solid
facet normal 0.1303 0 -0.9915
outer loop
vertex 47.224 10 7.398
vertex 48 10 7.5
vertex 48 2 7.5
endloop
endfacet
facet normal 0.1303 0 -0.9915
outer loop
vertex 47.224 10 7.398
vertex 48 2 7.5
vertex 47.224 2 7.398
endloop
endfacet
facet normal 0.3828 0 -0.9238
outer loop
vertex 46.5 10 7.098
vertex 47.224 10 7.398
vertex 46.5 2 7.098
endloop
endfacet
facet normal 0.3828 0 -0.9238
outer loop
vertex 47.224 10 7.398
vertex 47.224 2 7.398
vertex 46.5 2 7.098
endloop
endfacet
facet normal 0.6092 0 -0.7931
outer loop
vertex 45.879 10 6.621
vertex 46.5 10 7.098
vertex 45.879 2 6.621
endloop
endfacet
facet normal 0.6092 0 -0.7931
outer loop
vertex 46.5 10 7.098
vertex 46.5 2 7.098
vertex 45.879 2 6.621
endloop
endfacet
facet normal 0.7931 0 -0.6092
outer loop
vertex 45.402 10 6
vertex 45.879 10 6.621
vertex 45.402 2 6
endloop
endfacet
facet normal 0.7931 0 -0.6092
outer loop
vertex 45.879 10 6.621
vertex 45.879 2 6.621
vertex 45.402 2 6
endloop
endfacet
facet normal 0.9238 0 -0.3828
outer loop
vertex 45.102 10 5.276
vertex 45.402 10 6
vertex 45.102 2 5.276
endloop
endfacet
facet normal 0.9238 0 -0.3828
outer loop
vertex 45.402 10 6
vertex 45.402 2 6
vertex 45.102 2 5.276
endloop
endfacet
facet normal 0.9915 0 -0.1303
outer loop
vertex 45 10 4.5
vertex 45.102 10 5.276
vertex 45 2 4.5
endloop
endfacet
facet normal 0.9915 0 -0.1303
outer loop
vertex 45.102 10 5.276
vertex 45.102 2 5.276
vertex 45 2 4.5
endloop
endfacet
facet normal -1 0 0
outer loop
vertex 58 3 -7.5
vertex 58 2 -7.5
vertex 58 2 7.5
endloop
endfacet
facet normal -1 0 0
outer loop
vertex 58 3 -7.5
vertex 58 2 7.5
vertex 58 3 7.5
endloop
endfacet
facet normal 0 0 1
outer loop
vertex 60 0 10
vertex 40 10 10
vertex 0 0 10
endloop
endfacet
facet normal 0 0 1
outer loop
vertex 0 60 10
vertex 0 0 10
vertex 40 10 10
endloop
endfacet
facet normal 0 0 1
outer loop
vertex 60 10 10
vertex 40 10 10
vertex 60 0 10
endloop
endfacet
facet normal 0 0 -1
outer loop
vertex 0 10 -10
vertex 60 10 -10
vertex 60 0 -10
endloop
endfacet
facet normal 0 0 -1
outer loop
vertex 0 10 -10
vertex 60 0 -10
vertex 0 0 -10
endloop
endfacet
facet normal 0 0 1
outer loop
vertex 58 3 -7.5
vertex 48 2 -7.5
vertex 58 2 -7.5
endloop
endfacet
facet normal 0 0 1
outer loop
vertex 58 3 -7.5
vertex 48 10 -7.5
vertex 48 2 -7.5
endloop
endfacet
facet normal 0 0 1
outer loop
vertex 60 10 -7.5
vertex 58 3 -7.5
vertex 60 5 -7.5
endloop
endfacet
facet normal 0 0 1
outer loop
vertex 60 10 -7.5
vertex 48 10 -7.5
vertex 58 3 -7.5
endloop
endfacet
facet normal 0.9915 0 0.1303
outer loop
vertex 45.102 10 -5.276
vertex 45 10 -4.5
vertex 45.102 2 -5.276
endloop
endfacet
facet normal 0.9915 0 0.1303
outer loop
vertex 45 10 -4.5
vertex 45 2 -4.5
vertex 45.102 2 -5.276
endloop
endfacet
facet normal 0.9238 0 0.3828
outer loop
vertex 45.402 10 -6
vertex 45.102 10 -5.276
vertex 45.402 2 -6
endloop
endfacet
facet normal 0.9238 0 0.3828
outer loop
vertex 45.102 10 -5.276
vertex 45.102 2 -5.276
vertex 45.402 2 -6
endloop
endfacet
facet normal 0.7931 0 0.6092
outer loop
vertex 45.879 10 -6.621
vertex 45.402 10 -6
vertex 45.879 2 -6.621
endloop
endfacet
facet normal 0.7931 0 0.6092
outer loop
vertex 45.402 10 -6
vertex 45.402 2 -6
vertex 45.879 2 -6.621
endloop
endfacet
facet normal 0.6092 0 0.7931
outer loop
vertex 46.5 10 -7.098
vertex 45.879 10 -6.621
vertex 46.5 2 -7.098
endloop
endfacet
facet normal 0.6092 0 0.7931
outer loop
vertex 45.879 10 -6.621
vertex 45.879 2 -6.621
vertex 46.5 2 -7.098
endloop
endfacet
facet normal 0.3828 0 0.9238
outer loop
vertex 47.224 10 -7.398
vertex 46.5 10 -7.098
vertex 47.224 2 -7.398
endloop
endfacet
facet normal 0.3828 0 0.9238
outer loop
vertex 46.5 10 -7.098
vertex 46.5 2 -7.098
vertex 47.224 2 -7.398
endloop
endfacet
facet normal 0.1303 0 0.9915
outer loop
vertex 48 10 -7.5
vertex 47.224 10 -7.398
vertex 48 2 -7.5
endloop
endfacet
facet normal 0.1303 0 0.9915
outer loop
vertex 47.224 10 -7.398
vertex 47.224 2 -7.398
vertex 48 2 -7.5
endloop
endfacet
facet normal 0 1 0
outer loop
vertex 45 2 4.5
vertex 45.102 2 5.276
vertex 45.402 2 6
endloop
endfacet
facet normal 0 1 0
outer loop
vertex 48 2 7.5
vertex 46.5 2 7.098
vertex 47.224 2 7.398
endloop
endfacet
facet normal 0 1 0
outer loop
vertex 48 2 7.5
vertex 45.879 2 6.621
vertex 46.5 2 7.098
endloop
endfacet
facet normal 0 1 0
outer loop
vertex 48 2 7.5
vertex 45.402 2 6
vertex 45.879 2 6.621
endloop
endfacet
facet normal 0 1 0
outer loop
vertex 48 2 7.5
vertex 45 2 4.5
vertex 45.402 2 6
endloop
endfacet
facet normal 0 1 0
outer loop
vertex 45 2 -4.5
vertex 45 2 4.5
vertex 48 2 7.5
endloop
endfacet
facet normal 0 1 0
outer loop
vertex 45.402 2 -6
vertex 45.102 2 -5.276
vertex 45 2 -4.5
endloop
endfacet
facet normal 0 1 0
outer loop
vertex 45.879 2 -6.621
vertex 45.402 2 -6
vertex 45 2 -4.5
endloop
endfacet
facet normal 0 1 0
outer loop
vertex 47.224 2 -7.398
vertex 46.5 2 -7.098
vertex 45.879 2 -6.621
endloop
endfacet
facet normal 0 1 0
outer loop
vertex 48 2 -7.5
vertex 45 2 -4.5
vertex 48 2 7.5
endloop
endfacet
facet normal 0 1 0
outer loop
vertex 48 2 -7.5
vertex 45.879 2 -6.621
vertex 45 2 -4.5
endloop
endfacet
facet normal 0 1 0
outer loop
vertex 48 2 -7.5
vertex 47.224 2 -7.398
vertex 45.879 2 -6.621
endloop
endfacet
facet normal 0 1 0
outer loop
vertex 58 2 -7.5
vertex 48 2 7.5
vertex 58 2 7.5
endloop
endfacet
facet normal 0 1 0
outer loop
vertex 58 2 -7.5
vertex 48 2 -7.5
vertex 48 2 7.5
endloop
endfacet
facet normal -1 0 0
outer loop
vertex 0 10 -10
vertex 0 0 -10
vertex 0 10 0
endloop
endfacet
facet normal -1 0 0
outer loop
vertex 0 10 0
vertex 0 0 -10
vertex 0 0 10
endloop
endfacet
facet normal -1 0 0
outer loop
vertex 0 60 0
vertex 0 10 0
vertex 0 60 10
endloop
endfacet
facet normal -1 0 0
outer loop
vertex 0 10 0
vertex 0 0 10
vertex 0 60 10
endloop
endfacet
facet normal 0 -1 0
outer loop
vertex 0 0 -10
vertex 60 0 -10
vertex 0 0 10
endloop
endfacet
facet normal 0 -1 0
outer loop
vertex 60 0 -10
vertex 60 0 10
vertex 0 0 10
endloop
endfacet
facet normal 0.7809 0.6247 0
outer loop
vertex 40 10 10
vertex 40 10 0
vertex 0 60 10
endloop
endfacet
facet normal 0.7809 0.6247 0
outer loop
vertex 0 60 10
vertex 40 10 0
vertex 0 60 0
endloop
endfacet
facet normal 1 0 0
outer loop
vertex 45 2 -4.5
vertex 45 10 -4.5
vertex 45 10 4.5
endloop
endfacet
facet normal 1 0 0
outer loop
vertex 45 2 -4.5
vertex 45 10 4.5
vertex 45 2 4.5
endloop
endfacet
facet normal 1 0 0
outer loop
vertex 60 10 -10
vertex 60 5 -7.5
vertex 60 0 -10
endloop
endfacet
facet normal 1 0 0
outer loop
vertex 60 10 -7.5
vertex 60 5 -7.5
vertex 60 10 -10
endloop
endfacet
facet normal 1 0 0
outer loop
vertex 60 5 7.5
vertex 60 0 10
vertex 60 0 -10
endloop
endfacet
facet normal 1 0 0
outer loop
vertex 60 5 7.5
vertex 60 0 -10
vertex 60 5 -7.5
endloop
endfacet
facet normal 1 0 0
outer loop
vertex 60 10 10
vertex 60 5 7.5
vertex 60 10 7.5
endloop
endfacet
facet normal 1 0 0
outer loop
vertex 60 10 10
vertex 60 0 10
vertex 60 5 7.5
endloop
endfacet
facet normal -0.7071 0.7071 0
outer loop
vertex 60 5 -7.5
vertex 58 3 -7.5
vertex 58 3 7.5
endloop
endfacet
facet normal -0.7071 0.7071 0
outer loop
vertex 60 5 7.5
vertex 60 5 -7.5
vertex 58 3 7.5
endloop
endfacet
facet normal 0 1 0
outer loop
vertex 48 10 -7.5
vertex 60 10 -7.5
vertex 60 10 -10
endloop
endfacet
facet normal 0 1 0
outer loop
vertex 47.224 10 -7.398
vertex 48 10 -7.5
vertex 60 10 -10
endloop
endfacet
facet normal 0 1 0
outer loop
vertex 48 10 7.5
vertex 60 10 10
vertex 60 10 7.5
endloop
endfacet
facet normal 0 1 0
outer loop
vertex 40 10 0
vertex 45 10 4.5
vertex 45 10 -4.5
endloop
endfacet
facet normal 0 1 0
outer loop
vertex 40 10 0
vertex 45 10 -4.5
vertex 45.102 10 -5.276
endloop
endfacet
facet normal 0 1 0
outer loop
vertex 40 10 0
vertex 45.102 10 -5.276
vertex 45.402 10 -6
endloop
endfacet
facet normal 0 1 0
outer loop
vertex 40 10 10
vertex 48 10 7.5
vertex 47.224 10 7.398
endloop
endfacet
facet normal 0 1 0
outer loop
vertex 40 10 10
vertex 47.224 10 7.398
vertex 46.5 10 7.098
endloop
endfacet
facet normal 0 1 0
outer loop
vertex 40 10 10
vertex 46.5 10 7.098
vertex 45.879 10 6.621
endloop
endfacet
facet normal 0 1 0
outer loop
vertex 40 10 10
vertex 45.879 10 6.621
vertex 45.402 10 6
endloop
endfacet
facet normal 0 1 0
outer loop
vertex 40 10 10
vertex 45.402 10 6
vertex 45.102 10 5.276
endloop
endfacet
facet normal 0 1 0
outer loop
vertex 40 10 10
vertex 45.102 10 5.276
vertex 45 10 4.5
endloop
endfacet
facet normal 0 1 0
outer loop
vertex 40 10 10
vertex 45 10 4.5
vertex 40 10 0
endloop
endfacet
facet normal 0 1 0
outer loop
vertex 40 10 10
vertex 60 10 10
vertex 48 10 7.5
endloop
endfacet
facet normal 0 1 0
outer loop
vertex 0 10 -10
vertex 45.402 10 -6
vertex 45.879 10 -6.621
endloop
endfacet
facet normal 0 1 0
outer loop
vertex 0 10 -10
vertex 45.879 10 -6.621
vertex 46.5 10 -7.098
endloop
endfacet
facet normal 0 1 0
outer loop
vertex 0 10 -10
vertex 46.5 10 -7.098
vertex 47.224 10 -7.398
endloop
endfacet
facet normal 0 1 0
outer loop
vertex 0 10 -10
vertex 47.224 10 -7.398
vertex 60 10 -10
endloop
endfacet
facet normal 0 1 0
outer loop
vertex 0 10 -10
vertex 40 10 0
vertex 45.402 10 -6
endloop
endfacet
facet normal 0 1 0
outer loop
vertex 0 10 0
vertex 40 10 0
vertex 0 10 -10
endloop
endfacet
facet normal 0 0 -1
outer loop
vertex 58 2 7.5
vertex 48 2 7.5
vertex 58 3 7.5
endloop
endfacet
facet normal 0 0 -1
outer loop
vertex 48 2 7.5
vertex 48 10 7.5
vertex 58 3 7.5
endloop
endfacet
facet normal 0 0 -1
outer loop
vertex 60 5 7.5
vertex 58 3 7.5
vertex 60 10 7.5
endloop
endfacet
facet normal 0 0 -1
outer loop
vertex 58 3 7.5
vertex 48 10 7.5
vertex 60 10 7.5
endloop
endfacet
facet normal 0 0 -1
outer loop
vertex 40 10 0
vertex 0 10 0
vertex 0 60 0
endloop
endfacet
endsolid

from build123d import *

# Parameters (mm, degrees)
AUFSATZ_LINEAR_AUSTRAGEN1_DEPTH      = 10
SKIZZE2_W                            = 60
SKIZZE2_H                            = 10
AUFSATZ_LINEAR_AUSTRAGEN2_DEPTH      = 10
SCHNITT_LINEAR_AUSTRAGEN2_DEPTH      = 7.5
SCHNITT_LINEAR_AUSTRAGEN2_DEPTH_BACK = 7.5
FASE1_SIZE                           = 2
VERRUNDUNG1_R                        = 3


with BuildPart() as part:
    # Skizze1 → Aufsatz-Linear austragen1 (new body)
    with BuildSketch(Plane.XY):
        Polygon((40, 10), (0, 60), (0, 0), (60, 0), (60, 10), align=None)
    extrude(amount=AUFSATZ_LINEAR_AUSTRAGEN1_DEPTH)

    # Skizze2 → Aufsatz-Linear austragen2 (add)
    with BuildSketch(Plane(origin=(0, 0, 0), x_dir=(-1, 0, 0), z_dir=(0, 0, -1))):
        with Locations((-30, 5)):
            Rectangle(SKIZZE2_W, SKIZZE2_H)
    extrude(amount=AUFSATZ_LINEAR_AUSTRAGEN2_DEPTH)

    # Skizze4 → Schnitt-Linear austragen2 (cut, two sides: drawn at the far end of the back side and taken through both)
    with BuildSketch(Plane.XY.offset(-SCHNITT_LINEAR_AUSTRAGEN2_DEPTH_BACK)):
        Polygon((60, 10), (45, 10), (45, 2), (58, 2), (58, 5), (60, 5), align=None)
    extrude(amount=SCHNITT_LINEAR_AUSTRAGEN2_DEPTH + SCHNITT_LINEAR_AUSTRAGEN2_DEPTH_BACK, mode=Mode.SUBTRACT)

    # Fase1
    fase1_edges = [part.edges().sort_by_distance(p)[0] for p in [
        (58, 5, 0),
    ]]
    chamfer(fase1_edges, length=FASE1_SIZE - 0.0001)  # a hair under: the kernel refuses the full size

    # Verrundung1
    verrundung1_edges = [part.edges().sort_by_distance(p)[0] for p in [
        (45, 6, -7.5),
        (45, 6, 7.5),
    ]]
    fillet(verrundung1_edges, radius=VERRUNDUNG1_R)


solid = part.part
